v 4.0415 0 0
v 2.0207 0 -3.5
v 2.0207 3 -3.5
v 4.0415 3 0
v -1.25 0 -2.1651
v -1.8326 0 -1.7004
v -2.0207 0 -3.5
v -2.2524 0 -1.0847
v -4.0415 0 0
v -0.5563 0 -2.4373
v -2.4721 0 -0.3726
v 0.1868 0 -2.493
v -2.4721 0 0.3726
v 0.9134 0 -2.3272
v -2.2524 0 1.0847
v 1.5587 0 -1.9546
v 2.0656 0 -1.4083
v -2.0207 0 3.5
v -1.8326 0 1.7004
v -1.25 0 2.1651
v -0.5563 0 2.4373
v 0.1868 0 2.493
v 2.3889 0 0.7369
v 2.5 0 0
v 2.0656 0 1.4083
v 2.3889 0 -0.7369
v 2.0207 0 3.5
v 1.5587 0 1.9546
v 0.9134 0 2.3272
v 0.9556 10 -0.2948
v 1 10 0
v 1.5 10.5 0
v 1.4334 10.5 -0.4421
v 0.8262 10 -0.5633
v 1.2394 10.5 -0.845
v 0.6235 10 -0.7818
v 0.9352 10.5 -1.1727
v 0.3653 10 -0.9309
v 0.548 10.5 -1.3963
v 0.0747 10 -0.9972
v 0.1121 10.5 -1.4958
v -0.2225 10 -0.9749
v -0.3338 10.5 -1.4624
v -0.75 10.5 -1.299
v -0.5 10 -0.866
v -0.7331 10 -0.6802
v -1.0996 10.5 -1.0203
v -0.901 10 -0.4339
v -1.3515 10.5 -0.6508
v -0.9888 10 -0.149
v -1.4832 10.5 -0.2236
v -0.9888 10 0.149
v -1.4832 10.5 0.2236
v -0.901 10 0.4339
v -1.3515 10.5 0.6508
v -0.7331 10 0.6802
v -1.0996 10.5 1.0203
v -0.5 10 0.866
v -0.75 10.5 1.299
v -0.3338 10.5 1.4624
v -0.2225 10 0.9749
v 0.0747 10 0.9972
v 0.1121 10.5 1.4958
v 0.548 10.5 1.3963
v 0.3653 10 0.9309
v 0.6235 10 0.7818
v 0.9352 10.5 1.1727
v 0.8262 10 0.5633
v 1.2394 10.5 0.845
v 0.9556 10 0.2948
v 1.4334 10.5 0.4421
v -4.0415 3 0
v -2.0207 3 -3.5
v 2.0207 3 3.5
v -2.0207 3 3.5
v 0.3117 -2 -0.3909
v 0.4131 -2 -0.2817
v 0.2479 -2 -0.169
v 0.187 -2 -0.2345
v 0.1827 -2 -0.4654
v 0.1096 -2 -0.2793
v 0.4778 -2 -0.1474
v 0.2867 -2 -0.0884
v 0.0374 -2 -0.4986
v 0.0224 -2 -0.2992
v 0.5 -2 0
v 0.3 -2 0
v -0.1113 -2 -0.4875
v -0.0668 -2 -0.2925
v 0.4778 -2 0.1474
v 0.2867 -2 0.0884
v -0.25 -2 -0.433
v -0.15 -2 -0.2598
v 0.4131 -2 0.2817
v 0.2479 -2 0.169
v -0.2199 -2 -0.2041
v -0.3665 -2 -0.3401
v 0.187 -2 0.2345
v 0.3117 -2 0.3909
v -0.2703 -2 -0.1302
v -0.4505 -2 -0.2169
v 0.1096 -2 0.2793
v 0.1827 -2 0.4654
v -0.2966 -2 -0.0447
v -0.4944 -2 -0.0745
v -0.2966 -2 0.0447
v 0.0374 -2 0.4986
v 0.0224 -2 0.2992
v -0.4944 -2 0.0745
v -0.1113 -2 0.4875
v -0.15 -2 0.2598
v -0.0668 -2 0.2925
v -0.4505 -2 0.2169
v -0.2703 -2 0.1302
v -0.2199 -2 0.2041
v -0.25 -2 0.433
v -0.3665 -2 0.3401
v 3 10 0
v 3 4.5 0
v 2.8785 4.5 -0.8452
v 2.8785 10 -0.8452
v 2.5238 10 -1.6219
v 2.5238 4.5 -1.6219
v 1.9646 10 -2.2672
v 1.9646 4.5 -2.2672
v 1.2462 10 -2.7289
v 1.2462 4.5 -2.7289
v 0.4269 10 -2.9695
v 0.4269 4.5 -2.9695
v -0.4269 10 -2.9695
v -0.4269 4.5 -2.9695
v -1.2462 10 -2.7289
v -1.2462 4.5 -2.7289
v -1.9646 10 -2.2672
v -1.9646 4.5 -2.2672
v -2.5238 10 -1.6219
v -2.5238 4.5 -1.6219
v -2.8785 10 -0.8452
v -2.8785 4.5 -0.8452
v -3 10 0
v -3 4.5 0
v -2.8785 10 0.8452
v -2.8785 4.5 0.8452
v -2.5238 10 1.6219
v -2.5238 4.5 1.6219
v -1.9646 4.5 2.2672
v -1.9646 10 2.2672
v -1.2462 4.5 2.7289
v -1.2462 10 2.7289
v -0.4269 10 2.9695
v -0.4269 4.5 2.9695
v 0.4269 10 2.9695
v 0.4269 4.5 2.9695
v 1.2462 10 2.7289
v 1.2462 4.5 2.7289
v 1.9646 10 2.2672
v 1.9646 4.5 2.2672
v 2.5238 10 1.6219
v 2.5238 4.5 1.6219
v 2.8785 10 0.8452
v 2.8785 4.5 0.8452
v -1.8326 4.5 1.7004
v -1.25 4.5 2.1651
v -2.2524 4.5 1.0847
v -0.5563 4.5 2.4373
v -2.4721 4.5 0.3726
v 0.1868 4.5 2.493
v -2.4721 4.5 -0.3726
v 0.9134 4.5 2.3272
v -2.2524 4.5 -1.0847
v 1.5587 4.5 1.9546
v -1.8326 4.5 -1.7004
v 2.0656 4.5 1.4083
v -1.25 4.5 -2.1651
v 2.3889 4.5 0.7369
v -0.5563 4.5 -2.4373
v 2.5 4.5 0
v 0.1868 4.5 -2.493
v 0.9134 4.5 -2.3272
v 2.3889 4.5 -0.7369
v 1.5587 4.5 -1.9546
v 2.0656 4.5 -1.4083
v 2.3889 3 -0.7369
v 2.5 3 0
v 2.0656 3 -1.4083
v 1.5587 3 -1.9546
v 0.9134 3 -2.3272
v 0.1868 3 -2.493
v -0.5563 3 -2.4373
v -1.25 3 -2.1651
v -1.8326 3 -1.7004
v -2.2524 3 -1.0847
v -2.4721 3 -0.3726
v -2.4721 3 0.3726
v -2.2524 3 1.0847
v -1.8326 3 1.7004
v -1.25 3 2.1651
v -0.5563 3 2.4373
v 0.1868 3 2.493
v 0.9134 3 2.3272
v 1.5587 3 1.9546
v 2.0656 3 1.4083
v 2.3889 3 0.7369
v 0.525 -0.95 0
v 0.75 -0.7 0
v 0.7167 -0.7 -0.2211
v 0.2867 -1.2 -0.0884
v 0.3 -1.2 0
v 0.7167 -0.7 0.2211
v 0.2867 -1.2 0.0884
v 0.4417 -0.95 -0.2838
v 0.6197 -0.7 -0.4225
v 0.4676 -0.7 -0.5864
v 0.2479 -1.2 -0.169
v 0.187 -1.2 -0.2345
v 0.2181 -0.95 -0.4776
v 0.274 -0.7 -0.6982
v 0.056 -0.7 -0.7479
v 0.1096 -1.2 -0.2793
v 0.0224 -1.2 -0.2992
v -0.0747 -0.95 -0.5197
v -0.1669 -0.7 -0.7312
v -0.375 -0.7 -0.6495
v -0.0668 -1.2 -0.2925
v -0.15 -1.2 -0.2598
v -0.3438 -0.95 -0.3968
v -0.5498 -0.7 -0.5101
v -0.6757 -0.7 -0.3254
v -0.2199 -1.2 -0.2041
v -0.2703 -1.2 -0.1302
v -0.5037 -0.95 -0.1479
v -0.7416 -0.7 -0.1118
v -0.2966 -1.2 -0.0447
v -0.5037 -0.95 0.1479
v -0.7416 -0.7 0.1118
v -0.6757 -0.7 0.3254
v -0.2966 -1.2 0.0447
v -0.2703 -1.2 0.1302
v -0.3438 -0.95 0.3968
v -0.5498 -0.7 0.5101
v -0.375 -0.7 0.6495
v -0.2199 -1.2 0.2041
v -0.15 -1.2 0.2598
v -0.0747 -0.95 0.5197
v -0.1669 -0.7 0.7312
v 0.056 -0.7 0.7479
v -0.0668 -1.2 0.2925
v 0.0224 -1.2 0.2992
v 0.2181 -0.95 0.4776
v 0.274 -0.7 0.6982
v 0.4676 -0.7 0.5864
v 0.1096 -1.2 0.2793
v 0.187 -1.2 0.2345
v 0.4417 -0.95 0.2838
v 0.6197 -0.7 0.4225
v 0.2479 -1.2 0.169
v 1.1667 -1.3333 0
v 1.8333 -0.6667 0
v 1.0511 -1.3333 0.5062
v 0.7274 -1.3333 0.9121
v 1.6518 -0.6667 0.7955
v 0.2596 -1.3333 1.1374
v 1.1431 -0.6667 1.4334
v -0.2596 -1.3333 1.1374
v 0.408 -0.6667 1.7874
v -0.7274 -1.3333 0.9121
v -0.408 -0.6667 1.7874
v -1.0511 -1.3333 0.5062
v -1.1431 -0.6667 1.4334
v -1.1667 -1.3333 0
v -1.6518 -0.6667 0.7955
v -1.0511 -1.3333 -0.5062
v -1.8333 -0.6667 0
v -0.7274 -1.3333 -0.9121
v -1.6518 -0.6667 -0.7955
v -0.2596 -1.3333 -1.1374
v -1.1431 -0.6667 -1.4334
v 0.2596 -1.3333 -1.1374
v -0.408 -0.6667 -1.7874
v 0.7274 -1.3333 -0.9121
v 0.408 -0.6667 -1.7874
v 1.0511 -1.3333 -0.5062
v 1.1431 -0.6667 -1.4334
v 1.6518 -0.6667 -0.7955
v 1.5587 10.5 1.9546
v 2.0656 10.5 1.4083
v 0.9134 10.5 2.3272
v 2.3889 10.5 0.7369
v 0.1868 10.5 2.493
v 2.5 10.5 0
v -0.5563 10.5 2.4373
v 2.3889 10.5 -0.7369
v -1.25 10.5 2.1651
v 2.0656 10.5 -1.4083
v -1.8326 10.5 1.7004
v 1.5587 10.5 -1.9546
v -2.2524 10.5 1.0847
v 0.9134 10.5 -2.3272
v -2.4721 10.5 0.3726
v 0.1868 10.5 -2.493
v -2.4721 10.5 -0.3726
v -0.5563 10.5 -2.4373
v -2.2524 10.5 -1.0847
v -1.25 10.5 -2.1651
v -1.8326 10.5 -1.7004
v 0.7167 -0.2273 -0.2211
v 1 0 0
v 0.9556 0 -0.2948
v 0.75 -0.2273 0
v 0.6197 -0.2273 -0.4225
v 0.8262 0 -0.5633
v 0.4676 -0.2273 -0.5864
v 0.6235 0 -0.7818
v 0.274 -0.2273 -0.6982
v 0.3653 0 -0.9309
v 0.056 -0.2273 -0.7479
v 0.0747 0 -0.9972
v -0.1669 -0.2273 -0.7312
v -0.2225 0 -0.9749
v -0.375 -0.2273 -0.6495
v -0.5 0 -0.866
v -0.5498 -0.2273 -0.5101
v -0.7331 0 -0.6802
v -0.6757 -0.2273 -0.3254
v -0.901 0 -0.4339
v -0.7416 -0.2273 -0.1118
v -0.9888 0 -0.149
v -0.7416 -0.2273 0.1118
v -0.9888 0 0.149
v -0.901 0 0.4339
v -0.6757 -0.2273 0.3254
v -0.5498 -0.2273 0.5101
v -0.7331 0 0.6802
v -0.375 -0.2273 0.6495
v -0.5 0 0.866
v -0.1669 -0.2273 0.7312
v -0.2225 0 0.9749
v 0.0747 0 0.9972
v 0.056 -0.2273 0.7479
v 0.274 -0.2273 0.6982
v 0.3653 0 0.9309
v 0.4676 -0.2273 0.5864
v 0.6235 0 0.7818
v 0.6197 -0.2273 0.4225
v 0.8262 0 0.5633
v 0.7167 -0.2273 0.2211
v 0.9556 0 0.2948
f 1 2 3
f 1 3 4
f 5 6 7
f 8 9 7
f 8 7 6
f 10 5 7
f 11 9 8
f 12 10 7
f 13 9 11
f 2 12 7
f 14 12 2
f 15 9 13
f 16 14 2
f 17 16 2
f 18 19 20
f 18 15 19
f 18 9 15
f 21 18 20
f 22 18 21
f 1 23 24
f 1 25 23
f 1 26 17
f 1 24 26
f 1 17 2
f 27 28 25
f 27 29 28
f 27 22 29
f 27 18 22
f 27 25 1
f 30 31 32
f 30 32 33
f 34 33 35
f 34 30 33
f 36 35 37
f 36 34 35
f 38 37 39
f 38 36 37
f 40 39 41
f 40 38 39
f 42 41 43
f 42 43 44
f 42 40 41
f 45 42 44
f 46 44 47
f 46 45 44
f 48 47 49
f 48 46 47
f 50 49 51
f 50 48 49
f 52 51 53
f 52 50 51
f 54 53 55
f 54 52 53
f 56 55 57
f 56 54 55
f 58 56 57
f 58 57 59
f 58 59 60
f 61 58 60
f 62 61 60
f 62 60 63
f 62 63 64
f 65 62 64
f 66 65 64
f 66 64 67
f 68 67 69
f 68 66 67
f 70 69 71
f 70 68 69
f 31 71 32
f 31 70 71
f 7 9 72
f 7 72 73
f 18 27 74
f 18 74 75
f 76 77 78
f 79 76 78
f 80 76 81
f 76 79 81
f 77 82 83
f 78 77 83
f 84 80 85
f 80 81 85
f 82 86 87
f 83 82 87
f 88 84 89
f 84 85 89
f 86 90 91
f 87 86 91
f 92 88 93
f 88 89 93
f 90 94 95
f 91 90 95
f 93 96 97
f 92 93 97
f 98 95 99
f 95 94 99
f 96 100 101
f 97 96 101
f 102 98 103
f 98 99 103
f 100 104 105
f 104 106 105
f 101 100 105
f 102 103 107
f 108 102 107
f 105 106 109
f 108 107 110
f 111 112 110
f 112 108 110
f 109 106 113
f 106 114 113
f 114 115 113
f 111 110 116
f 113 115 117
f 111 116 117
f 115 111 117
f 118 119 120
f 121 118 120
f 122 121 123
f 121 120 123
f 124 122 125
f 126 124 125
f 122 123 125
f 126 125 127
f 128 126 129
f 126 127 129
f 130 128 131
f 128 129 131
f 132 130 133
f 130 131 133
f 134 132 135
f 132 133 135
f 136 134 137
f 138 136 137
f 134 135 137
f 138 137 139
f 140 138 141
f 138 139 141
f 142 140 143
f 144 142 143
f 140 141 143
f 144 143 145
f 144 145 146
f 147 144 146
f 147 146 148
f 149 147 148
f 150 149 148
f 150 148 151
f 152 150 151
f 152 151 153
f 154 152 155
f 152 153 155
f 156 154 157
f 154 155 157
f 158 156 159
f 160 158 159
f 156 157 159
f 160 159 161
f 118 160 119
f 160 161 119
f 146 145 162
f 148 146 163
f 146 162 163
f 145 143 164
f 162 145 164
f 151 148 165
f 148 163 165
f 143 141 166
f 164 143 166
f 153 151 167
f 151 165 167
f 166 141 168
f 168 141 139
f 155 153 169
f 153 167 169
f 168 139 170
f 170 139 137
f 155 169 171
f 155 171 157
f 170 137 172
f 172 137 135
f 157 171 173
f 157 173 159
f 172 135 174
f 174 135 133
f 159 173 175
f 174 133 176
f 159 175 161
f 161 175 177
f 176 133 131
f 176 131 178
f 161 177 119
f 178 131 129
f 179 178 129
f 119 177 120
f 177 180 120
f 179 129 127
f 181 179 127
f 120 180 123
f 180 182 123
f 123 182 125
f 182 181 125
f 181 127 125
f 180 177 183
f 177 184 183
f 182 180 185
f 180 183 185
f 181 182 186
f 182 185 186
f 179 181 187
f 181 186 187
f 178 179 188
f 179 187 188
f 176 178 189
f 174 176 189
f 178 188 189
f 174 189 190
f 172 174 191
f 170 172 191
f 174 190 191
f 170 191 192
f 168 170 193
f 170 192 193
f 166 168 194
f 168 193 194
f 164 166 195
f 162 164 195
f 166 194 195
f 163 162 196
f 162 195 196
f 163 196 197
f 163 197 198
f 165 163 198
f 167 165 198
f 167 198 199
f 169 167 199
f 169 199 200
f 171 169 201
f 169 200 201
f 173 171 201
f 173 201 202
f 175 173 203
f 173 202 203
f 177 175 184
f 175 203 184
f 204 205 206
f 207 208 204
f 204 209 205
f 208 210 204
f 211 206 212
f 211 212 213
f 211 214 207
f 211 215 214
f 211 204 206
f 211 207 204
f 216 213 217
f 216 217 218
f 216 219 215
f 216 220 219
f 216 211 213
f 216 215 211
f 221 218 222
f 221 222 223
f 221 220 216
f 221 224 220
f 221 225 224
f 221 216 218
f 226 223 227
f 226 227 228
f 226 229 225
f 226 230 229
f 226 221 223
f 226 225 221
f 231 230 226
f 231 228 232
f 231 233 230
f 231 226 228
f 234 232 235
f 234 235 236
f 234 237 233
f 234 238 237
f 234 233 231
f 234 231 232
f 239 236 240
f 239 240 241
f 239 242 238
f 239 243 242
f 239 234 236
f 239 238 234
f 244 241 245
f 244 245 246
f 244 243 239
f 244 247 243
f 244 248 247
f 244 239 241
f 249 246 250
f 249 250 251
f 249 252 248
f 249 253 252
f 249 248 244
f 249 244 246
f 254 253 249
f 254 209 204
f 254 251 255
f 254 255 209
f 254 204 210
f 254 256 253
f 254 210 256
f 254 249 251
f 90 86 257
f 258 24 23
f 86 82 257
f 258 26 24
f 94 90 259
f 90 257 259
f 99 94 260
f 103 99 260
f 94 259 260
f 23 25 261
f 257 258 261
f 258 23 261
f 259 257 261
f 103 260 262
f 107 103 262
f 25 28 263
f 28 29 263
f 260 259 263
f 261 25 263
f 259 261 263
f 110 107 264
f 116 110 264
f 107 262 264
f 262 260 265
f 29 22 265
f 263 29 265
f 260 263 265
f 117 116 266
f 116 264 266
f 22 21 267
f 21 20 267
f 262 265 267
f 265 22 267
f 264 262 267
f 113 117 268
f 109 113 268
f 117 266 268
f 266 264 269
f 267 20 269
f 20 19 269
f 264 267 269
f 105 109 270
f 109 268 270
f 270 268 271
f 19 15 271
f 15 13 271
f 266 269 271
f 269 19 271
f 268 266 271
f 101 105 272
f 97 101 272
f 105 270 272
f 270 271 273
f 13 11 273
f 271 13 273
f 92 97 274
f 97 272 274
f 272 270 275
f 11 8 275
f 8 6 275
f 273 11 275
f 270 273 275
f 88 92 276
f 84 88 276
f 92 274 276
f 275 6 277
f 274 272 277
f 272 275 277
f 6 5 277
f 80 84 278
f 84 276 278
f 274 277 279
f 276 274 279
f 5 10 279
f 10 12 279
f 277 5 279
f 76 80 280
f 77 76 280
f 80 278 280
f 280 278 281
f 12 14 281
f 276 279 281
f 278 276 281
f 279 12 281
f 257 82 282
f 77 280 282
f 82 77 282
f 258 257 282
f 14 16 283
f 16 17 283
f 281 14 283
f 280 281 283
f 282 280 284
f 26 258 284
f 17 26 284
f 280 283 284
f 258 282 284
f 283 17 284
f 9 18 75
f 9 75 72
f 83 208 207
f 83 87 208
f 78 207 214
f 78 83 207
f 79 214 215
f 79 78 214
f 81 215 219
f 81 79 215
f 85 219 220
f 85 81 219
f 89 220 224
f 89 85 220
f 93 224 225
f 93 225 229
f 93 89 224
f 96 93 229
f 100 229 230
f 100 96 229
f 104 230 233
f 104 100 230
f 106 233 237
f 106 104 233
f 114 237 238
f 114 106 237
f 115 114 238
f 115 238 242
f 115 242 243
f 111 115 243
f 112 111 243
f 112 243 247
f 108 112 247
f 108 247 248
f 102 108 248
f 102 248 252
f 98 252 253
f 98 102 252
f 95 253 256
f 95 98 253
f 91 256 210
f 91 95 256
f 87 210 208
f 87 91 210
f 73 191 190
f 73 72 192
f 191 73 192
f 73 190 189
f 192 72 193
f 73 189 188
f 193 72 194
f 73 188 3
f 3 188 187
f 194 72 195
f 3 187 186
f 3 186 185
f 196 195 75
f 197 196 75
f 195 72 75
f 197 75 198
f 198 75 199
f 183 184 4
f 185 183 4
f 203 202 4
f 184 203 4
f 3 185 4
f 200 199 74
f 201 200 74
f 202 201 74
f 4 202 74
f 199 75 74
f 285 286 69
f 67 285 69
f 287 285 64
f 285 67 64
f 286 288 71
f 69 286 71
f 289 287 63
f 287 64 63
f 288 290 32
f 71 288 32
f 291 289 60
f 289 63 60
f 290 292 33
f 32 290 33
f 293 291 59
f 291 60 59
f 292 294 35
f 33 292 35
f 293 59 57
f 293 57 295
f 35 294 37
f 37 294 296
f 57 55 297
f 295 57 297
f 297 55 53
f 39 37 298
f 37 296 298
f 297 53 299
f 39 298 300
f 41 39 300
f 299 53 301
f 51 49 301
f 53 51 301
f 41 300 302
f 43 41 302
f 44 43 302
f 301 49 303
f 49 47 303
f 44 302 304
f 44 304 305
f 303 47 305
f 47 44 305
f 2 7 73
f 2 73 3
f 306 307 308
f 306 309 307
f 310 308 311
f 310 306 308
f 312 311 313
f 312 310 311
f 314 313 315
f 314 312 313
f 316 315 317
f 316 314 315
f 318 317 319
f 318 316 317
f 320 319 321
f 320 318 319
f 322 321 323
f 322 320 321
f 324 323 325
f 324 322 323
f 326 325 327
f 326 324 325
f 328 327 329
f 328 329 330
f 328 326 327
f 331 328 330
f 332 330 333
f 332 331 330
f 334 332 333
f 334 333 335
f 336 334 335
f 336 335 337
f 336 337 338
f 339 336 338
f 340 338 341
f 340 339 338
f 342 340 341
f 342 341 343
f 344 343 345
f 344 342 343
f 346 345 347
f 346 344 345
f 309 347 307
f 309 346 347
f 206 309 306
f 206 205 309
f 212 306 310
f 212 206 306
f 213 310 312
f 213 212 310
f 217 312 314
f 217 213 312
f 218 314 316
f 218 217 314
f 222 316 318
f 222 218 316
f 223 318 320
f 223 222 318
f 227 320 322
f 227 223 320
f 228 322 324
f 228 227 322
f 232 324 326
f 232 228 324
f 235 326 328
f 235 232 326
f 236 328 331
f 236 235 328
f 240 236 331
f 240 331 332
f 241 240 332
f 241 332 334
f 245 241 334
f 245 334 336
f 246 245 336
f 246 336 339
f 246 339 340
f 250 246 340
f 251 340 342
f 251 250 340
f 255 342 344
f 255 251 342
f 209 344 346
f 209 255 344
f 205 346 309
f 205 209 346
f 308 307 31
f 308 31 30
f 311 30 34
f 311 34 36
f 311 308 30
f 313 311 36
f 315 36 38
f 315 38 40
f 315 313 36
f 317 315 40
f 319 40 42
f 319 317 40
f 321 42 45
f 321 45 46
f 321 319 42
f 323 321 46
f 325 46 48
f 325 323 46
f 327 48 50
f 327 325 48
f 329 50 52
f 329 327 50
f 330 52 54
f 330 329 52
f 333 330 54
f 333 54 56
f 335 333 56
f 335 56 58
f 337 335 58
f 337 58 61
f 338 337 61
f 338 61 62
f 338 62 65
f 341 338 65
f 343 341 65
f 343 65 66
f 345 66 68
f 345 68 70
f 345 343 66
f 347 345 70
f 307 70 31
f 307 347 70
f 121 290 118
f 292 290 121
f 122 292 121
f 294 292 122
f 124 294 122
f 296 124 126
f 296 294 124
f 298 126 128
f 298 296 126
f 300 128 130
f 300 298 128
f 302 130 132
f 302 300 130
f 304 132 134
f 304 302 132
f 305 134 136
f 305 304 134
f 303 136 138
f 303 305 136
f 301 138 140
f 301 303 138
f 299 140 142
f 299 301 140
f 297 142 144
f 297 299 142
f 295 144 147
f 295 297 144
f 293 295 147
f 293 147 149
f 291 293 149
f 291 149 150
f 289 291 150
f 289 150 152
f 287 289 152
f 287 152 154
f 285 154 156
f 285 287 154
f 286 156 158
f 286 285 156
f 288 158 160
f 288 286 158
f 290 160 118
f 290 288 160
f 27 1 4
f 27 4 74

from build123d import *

# Parameters (mm, degrees)
BOSS_EXTRUDE1_DEPTH = 3
CHAMFER1_SIZE       = 0.5


with BuildPart() as part:
    # Sketch1 → Boss-Extrude1 (new body)
    with BuildSketch(Plane.XZ):
        Polygon((-2.020725942, 3.5), (-4.041451884, 0), (-2.020725942, -3.5), (2.020725942, -3.5), (4.041451884, 0), (2.020725942, 3.5), align=None)
    extrude(amount=-BOSS_EXTRUDE1_DEPTH)

    # Sketch2 → Revolve1 (revolve)
    with BuildSketch(Plane(origin=(0, 0, 0), x_dir=(-1, 0, 0), z_dir=(0, 0, -1))):
        Polygon((-2.5, 3), (0, 3), (0, 10.5), (-3, 10.5), (-3, 4.5), (-2.5, 4.5), align=None)
    revolve(axis=Axis((0, 3, 0), (0, 1, 0)))

    # Sketch3 → Revolve2 (revolve)
    with BuildSketch(Plane.XY):
        Polygon((2.5, 0), (0, 0), (0, -2), (0.5, -2), align=None)
    revolve(axis=Axis((0, 0, 0), (0, -1, 0)))

    # Sketch4 → Cut-Revolve1 (revolve, cut)
    with BuildSketch(Plane(origin=(0, 0, 0), x_dir=(-1, 0, 0), z_dir=(0, 0, -1))):
        Polygon((-0.3, -2), (0, -2), (0, 10.5), (-1, 10.5), (-1, 0), (-0.75, -0.227272727), (-0.75, -0.7), (-0.3, -1.2), align=None)
    revolve(axis=Axis((0, -2, 0), (0, 1, 0)), mode=Mode.SUBTRACT)

    # Chamfer1
    chamfer1_edges = [part.edges().sort_by_distance(p)[0] for p in [
        (-3, 10.5, 0),
        (-1, 10.5, 0),
    ]]
    chamfer(chamfer1_edges, length=CHAMFER1_SIZE)


solid = part.part
